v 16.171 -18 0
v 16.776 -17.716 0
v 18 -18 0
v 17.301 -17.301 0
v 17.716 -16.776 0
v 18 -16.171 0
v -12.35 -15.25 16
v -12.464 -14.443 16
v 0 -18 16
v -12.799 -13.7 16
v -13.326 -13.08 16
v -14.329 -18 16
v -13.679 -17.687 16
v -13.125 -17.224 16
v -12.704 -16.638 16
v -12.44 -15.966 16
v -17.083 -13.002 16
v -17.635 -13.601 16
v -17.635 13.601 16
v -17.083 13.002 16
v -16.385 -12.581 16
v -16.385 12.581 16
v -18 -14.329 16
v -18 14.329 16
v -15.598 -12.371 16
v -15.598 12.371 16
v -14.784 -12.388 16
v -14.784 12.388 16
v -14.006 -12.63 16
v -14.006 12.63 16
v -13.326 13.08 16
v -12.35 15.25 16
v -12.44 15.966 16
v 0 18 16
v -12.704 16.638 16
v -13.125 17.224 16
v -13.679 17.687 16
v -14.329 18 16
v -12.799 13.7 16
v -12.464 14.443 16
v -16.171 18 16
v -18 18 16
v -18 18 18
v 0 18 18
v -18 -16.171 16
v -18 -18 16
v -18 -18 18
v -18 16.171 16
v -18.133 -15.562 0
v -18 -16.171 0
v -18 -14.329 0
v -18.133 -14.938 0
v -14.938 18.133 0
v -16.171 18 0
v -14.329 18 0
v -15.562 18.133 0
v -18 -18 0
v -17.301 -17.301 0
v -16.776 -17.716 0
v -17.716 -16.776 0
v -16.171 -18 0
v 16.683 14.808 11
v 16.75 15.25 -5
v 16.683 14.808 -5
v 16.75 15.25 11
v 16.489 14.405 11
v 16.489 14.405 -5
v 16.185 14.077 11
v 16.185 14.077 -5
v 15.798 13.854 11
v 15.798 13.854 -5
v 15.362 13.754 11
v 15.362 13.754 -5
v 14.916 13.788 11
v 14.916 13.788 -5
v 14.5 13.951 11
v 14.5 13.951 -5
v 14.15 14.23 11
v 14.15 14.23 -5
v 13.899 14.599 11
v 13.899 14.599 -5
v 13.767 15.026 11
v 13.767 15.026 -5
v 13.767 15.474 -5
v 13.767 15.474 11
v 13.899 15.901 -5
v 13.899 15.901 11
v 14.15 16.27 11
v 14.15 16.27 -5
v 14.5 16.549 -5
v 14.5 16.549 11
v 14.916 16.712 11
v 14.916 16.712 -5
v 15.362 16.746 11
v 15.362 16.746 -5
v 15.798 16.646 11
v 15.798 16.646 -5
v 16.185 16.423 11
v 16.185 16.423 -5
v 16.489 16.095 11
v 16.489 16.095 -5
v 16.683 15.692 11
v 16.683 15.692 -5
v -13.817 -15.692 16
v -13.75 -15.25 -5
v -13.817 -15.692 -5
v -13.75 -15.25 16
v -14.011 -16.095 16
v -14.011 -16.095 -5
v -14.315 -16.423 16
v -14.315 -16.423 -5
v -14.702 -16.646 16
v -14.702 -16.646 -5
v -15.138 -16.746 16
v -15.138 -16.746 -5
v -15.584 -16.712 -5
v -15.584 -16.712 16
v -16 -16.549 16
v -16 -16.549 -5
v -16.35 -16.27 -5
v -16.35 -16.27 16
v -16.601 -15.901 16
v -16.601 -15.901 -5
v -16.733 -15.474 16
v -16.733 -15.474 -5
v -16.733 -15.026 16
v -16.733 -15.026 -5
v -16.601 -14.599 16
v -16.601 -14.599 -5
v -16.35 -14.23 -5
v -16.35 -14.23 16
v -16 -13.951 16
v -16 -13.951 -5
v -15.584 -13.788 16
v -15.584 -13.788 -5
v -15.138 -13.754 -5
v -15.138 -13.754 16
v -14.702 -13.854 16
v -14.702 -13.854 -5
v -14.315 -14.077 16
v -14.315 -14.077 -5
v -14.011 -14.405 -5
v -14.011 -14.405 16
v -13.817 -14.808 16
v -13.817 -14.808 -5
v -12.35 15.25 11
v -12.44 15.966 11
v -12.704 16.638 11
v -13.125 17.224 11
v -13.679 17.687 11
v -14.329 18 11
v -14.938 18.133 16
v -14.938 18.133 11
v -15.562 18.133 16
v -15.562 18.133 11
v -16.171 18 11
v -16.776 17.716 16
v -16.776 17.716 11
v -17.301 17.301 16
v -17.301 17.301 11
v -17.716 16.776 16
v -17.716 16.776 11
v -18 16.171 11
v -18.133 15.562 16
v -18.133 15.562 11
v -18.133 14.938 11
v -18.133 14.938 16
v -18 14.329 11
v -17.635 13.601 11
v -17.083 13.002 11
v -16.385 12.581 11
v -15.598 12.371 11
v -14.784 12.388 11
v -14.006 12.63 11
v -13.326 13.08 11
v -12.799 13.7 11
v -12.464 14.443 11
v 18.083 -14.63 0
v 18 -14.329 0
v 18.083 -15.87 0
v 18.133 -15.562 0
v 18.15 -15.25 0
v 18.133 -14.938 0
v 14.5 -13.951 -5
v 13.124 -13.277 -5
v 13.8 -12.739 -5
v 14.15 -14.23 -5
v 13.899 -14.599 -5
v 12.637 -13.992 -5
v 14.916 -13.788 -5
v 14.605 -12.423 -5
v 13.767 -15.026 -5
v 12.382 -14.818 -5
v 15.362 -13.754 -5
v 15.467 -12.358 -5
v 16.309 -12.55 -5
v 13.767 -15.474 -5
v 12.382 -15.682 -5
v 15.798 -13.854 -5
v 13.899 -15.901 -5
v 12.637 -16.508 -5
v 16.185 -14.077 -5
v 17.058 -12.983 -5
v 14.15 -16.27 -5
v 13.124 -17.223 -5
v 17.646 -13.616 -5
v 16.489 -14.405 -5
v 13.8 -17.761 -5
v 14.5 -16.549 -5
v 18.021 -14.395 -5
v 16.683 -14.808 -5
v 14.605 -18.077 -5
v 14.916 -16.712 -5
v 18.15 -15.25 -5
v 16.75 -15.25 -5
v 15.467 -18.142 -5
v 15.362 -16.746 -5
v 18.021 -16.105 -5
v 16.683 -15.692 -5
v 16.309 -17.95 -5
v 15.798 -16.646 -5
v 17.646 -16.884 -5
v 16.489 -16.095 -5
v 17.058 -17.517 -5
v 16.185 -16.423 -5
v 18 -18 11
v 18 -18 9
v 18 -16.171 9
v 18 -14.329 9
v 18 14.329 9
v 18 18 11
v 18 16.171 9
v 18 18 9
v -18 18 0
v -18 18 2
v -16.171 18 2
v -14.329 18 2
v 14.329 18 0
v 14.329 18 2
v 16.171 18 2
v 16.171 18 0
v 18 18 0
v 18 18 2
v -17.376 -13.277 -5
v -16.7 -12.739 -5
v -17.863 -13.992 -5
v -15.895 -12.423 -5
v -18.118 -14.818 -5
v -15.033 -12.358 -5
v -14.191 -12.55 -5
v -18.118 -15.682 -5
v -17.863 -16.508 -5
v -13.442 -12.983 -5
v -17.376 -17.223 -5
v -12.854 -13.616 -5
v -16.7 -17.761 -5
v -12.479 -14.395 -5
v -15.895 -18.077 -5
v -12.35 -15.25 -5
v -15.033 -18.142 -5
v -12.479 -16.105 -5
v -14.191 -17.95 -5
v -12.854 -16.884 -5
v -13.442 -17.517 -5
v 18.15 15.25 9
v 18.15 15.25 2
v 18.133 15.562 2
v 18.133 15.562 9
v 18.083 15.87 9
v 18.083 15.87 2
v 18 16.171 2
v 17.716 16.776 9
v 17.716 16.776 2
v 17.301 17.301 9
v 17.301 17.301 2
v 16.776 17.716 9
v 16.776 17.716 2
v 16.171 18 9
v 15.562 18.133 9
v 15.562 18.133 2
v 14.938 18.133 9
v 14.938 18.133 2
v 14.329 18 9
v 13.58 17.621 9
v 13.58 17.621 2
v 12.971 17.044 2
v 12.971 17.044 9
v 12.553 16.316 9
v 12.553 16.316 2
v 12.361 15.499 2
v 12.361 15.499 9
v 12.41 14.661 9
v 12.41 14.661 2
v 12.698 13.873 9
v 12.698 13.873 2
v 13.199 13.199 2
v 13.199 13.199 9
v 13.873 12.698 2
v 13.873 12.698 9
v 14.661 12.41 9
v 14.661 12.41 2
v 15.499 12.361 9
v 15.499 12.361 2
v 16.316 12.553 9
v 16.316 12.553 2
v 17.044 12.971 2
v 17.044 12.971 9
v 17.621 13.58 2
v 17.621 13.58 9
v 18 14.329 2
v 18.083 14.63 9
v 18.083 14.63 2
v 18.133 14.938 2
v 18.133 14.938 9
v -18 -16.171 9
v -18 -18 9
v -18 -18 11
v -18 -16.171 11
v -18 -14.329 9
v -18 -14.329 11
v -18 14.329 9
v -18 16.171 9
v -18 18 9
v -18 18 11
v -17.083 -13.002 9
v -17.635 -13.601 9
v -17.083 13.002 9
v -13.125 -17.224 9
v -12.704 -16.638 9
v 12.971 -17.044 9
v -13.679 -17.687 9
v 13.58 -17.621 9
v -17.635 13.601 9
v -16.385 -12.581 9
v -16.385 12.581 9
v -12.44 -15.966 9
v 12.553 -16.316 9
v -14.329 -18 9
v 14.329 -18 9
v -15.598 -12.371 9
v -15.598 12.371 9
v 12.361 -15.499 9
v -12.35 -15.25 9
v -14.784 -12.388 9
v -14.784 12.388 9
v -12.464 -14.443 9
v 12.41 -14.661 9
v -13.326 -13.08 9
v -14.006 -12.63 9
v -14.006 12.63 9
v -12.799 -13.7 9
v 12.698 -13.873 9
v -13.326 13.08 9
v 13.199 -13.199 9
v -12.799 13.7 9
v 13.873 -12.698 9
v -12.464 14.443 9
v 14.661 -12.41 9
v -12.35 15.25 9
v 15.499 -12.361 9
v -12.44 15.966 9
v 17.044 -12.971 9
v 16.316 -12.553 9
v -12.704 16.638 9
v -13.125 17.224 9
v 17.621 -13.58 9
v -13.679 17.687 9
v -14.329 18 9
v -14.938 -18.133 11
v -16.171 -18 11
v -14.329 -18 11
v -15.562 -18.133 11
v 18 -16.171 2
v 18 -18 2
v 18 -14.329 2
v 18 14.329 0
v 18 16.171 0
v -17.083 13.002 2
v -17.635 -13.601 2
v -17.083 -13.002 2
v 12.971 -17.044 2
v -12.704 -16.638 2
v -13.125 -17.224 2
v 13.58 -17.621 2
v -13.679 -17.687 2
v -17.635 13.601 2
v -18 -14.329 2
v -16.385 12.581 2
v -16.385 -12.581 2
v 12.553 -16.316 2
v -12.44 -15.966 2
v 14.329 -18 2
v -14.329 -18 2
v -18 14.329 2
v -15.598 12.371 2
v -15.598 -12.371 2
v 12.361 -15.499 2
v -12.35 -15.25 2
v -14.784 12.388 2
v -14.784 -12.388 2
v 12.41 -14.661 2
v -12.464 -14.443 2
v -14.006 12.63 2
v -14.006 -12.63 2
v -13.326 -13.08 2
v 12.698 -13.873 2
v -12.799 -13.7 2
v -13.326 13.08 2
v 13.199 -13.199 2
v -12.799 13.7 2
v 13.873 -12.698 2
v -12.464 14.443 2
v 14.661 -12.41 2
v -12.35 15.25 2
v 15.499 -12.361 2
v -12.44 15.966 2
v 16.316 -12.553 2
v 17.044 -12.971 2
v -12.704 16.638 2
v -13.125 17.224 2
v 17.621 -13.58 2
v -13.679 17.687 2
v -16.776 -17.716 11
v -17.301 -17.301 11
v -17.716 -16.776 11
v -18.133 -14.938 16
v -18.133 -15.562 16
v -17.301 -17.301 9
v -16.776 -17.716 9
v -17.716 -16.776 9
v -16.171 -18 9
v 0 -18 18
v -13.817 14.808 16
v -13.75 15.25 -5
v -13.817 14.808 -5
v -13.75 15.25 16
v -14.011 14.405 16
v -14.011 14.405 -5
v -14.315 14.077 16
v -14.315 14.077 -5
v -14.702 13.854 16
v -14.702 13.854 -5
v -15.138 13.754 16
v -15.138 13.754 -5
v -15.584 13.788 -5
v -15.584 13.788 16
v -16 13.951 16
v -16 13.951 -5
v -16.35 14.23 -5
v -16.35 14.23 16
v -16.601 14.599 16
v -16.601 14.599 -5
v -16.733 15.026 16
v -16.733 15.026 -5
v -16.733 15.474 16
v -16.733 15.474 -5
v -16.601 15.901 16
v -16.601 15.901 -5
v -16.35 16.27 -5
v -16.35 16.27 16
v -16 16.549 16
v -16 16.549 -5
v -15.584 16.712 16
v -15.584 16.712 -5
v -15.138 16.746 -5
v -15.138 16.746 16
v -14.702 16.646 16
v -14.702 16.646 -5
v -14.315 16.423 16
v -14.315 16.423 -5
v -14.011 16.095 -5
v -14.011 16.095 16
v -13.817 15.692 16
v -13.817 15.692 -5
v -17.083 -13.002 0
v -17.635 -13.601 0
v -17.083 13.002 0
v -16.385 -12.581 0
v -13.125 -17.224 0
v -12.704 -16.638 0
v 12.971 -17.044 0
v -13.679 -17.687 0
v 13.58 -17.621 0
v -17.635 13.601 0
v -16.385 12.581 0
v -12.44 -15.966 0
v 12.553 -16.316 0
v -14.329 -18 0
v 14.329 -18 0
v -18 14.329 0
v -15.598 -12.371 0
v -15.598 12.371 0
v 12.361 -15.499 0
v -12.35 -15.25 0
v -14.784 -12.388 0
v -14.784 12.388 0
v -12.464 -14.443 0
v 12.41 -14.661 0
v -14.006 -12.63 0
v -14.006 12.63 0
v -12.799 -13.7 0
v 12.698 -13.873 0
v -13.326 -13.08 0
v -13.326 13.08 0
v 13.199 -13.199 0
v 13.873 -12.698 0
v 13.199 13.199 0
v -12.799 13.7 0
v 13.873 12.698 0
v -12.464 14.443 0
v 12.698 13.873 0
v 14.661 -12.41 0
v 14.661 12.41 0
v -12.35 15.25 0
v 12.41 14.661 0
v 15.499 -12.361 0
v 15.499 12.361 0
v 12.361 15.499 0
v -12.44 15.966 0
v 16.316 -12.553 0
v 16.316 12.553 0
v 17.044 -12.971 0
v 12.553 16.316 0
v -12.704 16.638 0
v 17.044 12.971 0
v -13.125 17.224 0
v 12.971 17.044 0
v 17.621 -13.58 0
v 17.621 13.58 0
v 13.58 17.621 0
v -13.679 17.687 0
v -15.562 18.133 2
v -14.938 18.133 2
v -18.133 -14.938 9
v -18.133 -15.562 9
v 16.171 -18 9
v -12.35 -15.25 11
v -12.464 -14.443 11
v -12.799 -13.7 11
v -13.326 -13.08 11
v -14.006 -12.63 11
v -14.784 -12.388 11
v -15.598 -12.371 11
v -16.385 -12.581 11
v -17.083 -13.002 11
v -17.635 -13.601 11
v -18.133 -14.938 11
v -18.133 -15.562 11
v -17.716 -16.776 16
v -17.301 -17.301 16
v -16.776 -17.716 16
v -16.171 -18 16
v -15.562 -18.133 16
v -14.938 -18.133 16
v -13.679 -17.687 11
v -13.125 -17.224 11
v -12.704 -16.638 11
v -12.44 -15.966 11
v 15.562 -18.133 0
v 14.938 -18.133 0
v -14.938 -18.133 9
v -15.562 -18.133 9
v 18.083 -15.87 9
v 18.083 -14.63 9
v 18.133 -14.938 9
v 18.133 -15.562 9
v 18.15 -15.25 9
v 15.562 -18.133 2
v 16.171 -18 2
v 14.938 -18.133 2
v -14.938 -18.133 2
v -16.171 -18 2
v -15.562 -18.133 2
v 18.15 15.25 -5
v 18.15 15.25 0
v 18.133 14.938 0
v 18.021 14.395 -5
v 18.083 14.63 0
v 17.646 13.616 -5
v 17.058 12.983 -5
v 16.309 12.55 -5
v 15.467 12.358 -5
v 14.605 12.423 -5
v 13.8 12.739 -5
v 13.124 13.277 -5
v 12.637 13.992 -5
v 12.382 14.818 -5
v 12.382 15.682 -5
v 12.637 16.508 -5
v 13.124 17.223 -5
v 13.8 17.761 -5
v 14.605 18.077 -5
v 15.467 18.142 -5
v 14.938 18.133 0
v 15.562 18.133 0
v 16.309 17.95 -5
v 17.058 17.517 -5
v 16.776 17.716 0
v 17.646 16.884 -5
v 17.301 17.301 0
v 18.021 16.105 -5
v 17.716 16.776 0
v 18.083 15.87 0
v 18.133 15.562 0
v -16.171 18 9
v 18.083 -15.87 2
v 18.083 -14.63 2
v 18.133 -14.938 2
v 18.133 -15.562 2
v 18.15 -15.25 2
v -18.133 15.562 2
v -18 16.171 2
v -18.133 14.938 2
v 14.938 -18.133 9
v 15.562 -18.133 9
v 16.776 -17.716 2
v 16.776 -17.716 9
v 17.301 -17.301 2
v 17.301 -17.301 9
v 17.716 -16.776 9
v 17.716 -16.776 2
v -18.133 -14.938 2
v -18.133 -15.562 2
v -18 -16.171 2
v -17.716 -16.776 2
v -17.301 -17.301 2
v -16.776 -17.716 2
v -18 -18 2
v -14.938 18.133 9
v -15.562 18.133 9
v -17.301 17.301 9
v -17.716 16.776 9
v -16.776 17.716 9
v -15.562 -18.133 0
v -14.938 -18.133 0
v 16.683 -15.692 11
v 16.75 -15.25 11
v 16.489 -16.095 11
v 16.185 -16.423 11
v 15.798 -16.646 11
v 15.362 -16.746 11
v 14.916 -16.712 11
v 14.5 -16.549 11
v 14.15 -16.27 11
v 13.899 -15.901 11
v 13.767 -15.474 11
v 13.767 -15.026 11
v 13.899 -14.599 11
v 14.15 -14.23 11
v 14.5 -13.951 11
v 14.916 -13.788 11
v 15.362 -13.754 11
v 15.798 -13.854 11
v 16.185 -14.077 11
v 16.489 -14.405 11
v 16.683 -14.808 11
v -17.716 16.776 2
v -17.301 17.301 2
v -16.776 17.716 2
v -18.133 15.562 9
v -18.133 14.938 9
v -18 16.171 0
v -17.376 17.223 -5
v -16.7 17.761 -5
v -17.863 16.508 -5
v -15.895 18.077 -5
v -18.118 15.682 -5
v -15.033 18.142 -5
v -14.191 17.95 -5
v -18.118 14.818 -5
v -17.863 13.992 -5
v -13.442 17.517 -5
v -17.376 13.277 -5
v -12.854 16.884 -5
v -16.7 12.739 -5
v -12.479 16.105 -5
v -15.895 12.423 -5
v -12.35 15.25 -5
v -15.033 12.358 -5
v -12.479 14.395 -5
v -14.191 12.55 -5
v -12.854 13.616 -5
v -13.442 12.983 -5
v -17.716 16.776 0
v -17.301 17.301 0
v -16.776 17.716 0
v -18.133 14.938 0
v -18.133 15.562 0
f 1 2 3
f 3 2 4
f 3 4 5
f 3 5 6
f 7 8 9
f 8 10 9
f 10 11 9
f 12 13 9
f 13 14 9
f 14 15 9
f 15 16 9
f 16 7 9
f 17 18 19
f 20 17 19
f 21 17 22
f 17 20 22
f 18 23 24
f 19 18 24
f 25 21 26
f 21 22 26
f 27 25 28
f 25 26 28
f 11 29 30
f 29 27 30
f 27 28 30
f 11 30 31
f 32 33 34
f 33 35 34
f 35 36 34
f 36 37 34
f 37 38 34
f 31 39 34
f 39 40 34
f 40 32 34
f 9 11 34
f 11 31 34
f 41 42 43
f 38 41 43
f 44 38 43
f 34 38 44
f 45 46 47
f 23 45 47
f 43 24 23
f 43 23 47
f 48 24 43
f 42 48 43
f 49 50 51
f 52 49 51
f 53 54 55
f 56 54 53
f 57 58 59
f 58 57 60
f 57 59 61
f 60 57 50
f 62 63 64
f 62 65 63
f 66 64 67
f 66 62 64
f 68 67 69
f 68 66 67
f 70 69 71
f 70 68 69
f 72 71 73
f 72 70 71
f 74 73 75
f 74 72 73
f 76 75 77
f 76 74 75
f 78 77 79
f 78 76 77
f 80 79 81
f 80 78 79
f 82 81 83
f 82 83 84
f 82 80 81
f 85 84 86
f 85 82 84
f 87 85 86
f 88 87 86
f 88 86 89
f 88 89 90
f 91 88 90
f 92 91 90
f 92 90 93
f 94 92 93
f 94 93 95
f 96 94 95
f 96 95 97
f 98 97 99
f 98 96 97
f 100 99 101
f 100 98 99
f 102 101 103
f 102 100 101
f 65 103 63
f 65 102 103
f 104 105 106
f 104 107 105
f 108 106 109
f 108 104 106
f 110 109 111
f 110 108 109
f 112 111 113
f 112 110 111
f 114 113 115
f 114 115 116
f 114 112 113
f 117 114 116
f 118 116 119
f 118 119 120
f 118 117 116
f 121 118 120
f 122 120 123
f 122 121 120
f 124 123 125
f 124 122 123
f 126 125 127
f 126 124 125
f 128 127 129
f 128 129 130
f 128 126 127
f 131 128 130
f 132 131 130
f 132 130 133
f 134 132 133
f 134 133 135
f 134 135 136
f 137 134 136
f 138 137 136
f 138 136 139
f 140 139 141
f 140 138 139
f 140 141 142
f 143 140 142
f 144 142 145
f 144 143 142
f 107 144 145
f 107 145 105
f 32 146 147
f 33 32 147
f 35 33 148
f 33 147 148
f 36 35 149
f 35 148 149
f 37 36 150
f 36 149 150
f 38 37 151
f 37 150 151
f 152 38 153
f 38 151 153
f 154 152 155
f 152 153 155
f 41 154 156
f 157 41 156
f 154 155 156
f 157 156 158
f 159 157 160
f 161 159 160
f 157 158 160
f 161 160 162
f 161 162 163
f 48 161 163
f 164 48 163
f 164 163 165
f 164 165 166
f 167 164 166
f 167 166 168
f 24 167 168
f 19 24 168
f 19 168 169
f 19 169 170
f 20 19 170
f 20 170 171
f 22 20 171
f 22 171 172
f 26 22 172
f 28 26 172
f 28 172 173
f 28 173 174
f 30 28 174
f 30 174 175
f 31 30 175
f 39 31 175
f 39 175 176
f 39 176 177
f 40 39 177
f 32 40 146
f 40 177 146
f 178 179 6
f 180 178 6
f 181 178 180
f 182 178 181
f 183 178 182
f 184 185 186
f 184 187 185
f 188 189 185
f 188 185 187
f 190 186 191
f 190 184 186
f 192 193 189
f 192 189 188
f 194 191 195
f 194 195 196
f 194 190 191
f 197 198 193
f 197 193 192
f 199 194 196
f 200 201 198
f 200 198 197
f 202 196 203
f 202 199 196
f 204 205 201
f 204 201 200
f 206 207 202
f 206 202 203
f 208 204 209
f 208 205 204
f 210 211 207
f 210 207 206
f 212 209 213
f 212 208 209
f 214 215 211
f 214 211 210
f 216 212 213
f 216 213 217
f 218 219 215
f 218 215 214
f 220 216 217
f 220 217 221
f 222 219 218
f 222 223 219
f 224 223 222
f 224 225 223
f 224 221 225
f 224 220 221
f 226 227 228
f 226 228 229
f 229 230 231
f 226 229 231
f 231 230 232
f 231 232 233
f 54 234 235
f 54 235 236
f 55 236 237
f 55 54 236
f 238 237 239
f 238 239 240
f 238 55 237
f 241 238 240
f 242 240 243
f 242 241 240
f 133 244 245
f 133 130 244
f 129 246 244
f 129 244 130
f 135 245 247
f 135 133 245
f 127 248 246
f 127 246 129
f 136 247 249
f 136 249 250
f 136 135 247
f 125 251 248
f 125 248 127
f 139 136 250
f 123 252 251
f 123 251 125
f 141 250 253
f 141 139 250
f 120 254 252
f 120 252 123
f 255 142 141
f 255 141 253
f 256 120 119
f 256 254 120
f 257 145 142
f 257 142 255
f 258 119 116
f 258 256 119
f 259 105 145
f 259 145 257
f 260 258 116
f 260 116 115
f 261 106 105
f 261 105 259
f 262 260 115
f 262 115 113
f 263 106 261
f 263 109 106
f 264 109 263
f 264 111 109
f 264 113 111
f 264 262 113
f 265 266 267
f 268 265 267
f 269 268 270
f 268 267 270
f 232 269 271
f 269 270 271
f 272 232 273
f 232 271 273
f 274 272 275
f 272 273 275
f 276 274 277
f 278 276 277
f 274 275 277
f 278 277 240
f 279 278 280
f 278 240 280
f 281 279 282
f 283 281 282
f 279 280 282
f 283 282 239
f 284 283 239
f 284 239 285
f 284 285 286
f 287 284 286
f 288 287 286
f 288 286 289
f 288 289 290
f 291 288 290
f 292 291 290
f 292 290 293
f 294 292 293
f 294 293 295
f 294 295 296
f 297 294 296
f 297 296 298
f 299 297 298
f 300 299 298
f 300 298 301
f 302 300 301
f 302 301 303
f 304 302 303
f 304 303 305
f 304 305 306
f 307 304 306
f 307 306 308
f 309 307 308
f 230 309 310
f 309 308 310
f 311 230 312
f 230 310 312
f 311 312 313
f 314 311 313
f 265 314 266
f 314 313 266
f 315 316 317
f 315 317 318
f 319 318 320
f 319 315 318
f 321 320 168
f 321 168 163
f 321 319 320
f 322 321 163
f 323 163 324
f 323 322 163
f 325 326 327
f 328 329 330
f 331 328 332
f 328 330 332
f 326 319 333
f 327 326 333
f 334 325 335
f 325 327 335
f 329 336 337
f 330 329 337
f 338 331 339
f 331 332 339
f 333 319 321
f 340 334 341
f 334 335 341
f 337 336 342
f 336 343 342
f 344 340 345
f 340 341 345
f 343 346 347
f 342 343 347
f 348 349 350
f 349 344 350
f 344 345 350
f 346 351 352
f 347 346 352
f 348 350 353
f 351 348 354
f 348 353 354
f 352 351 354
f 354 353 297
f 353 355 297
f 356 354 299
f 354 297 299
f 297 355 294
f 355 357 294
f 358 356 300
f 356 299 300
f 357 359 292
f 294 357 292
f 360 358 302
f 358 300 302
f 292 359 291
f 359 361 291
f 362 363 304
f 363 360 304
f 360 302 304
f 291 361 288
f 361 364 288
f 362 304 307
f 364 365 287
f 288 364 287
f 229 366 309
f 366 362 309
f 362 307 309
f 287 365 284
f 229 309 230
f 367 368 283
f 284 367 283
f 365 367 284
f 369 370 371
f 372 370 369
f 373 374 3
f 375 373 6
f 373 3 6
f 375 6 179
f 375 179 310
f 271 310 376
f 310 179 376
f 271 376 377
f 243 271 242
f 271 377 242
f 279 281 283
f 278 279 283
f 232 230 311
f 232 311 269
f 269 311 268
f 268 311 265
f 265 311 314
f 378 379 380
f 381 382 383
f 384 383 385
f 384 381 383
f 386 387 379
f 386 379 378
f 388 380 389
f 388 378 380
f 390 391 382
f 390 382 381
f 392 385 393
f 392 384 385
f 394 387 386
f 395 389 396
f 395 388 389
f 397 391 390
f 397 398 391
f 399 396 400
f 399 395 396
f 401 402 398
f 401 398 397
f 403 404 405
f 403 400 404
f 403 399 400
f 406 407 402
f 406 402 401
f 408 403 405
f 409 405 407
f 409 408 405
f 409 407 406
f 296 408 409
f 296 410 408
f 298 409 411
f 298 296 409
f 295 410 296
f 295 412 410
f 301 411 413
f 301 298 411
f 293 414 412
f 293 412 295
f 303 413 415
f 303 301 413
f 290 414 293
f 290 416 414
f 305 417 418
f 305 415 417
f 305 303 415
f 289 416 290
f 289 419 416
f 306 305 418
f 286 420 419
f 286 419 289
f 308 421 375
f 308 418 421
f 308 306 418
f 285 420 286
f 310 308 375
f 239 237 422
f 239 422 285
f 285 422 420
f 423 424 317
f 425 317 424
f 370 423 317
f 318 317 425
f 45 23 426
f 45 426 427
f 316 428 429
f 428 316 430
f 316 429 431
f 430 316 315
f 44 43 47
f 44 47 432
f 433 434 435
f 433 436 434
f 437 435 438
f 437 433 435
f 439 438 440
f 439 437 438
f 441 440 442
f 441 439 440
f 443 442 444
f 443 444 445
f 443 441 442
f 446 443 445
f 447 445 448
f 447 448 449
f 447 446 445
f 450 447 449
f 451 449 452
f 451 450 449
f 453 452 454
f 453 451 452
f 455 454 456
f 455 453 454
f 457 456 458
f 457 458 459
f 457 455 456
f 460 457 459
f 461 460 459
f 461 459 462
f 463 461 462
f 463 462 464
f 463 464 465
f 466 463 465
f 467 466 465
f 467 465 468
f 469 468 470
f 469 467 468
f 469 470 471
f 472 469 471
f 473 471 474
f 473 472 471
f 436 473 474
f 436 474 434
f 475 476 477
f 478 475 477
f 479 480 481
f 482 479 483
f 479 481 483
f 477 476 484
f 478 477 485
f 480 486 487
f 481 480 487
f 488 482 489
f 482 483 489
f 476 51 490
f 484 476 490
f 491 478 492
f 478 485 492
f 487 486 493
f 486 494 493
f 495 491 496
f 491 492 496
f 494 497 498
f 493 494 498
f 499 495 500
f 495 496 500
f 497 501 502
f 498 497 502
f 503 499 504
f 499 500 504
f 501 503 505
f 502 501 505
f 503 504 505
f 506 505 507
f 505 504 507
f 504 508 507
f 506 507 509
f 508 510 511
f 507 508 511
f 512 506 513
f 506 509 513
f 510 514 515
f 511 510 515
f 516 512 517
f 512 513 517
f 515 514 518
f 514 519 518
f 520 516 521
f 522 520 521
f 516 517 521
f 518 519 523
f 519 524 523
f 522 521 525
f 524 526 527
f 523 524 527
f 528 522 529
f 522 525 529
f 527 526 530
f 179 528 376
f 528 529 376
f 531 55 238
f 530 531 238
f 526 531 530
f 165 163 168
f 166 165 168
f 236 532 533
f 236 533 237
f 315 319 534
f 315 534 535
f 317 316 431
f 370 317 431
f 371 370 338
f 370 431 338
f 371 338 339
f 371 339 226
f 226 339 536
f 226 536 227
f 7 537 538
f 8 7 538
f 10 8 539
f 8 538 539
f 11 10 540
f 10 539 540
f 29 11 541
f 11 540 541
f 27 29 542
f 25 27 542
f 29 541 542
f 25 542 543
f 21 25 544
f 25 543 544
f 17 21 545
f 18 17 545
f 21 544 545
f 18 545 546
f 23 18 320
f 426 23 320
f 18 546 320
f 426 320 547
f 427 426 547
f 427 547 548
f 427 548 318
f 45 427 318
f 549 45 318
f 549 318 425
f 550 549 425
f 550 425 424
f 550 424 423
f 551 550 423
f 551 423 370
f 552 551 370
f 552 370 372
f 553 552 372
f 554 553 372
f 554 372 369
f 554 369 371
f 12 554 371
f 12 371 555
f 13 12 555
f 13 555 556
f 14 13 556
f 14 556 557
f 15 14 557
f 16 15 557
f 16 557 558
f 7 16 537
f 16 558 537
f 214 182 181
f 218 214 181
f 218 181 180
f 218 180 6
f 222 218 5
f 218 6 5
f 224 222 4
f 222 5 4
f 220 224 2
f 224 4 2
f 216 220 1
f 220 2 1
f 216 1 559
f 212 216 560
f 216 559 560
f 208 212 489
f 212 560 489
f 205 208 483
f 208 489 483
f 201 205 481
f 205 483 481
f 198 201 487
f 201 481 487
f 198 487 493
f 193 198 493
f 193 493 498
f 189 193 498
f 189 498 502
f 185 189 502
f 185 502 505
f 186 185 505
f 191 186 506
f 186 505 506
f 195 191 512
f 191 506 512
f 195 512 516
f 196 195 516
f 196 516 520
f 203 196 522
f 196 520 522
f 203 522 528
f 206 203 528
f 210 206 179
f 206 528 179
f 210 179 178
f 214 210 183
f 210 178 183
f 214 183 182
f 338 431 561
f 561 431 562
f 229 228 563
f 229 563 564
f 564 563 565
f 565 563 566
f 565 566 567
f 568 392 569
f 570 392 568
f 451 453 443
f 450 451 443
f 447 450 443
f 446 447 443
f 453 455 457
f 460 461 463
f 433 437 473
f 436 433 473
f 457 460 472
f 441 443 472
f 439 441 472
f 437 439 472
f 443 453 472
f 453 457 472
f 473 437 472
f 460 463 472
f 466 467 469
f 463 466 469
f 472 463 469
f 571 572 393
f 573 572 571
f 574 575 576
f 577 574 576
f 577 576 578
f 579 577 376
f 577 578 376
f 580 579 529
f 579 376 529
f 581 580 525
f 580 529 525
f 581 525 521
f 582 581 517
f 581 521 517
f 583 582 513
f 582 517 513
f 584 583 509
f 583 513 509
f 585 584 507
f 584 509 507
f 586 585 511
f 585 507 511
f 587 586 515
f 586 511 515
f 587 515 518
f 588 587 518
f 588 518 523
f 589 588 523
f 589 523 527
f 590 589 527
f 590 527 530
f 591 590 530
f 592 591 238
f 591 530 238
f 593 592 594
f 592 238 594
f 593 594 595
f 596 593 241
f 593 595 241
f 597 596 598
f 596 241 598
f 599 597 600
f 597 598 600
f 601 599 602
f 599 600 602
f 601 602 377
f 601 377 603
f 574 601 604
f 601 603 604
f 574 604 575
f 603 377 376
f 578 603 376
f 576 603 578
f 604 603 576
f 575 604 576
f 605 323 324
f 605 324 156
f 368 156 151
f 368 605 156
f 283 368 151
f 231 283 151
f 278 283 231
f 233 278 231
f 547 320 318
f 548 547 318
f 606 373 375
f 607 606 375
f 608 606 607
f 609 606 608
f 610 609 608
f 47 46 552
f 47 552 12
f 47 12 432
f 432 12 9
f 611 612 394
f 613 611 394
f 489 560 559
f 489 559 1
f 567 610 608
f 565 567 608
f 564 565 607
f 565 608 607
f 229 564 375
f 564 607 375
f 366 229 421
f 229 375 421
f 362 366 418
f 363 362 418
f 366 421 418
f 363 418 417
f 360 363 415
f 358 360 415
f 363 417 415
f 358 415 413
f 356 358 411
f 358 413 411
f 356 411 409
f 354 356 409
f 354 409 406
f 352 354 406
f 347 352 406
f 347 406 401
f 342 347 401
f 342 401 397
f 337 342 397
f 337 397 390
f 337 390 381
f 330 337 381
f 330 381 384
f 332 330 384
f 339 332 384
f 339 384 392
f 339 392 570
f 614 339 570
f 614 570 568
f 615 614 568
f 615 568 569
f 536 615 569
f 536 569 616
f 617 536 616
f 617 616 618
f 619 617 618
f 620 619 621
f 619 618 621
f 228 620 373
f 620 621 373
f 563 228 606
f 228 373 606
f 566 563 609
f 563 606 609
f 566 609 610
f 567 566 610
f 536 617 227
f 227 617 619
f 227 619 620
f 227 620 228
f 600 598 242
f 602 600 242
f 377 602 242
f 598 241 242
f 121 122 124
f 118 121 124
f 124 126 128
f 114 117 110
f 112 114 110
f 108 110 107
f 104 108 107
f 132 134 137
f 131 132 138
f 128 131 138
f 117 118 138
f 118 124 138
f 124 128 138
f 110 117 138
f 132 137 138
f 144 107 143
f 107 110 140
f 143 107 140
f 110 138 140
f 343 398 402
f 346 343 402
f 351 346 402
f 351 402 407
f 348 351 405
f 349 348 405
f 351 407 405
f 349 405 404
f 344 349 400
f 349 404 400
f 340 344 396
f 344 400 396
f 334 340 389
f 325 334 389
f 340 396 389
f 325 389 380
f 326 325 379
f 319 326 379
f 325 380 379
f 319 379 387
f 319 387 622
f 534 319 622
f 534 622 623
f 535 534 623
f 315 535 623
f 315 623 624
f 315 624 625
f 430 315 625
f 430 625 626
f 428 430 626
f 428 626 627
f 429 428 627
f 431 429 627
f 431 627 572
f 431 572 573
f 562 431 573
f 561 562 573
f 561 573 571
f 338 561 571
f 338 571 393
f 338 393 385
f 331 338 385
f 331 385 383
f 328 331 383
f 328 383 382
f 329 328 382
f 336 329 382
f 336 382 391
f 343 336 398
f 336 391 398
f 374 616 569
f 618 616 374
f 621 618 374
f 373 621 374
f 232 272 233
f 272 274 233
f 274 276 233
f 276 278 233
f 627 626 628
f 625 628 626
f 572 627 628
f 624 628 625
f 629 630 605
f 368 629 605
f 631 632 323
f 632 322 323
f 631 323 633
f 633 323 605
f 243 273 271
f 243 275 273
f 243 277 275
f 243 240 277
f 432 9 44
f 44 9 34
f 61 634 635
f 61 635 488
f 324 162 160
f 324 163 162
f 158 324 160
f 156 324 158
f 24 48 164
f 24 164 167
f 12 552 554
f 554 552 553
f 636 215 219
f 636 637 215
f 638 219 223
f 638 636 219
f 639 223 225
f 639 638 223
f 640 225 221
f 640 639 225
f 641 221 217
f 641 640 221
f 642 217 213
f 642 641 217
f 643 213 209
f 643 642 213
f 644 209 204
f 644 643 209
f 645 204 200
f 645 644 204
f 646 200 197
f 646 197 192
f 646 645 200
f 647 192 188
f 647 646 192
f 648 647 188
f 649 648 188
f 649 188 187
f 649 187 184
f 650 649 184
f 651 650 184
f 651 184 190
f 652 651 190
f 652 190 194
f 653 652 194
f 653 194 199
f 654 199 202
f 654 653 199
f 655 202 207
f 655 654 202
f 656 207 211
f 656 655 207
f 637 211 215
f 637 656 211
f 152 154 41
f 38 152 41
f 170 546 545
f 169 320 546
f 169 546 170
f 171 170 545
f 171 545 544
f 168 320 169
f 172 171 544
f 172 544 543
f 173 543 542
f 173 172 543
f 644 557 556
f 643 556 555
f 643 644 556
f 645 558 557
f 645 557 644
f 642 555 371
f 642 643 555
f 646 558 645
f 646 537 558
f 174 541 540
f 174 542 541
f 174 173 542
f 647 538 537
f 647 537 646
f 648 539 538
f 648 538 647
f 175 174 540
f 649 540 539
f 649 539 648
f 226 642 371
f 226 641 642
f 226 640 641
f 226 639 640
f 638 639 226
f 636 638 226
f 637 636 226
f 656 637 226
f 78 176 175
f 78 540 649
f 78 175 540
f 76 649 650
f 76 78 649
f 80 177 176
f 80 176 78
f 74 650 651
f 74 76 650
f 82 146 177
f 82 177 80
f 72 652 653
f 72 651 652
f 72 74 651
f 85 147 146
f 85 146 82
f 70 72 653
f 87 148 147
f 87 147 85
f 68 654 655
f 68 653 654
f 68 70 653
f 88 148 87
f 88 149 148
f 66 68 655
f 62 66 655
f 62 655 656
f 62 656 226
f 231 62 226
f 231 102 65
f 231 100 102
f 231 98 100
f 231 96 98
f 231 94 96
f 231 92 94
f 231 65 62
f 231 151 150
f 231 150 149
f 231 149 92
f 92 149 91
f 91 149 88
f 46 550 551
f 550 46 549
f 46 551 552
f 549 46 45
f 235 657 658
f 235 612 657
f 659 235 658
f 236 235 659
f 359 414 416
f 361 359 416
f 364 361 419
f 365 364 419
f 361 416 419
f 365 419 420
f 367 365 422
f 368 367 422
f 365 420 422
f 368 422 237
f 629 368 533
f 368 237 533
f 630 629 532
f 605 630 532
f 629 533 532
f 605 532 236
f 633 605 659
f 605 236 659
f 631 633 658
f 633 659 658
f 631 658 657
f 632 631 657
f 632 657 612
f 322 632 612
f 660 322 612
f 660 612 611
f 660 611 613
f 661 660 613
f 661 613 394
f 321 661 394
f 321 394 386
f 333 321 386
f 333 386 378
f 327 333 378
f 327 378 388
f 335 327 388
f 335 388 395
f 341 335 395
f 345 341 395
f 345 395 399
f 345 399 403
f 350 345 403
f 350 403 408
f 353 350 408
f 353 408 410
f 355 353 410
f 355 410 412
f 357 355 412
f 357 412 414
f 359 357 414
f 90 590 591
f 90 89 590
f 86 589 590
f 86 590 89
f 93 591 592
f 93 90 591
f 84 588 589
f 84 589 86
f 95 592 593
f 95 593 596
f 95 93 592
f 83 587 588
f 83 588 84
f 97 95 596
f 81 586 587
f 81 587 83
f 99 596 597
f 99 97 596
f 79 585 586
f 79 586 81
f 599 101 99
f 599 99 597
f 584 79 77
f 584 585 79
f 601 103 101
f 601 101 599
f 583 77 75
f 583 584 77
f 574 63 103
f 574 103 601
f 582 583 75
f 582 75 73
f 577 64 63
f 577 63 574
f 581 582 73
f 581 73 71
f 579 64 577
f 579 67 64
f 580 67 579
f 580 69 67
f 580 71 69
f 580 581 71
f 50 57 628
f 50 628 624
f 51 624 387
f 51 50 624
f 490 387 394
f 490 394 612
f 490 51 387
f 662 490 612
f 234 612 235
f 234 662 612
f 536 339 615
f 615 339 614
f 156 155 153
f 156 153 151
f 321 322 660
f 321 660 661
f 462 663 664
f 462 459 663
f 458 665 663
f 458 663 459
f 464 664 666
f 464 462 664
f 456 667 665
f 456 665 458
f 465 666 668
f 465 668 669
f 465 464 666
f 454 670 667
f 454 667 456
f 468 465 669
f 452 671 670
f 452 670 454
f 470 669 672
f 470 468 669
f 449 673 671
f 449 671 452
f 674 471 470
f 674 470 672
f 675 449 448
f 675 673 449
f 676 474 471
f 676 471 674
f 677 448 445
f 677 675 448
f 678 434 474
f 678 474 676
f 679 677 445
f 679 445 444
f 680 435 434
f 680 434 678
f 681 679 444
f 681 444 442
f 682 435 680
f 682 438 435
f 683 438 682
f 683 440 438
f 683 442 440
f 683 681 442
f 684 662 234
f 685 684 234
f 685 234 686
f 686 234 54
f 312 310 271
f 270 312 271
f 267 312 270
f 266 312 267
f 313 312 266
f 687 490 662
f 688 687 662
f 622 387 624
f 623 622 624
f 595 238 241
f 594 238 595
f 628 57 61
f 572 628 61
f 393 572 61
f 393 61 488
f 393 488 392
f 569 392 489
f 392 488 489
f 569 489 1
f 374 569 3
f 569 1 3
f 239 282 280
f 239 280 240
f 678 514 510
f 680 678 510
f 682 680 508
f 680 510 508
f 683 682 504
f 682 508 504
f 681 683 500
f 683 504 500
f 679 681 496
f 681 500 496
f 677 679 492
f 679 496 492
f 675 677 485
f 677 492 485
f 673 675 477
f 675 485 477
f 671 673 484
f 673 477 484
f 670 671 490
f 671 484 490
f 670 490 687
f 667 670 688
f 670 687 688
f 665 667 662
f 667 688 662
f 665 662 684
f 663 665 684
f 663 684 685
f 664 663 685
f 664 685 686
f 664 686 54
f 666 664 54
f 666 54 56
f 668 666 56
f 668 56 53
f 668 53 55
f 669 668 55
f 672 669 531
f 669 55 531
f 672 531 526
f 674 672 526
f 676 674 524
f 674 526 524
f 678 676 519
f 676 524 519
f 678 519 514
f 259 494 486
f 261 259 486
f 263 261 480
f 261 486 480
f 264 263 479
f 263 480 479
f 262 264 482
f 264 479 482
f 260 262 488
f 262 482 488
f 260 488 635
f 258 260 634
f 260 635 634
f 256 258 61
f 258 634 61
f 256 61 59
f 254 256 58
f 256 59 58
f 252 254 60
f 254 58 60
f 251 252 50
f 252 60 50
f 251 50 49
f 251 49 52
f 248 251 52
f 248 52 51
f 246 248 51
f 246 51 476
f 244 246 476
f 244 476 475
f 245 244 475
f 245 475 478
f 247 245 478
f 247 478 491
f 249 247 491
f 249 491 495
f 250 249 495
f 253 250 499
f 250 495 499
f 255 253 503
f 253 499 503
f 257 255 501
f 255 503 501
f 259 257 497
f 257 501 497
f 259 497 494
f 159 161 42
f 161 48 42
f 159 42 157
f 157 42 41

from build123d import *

# Parameters (mm, degrees)
SKETCH_W      = 36
SKETCH_H      = 36
SKETCH_R      = 1.5
PAD_DEPTH     = 2
SKETCH001_R   = 2.9
SKETCH001_R_2 = 1.5
PAD001_DEPTH  = 7
SKETCH002_W   = 36
SKETCH002_H   = 36
SKETCH002_R   = 1.5
PAD002_DEPTH  = 2
SKETCH003_R   = 2.9
SKETCH003_R_2 = 1.5
PAD003_DEPTH  = 5
SKETCH004_W   = 18
SKETCH004_H   = 36
PAD004_DEPTH  = 2
SKETCH005_R   = 2.9
SKETCH005_R_2 = 1.5
PAD005_DEPTH  = 5


with BuildPart() as part:
    # Sketch → Pad (new body)
    with BuildSketch(Plane.XY):
        Rectangle(SKETCH_W, SKETCH_H)
        with Locations((-15.25, -15.25)):
            Circle(SKETCH_R, mode=Mode.SUBTRACT)
        with Locations((15.25, -15.25)):
            Circle(SKETCH_R, mode=Mode.SUBTRACT)
        with Locations((-15.25, 15.25)):
            Circle(SKETCH_R, mode=Mode.SUBTRACT)
        with Locations((15.25, 15.25)):
            Circle(SKETCH_R, mode=Mode.SUBTRACT)
    extrude(amount=PAD_DEPTH)

    # Sketch001 (on Face10 of Pad) → Pad001 (join)
    with BuildSketch(Plane.XY.offset(2)):
        with Locations((-15.25, 15.25)):
            Circle(SKETCH001_R)
        with Locations((-15.25, 15.25)):
            Circle(SKETCH001_R_2, mode=Mode.SUBTRACT)
        with Locations((-15.25, -15.25)):
            Circle(SKETCH001_R)
        with Locations((-15.25, -15.25)):
            Circle(SKETCH001_R_2, mode=Mode.SUBTRACT)
        with Locations((15.25, -15.25)):
            Circle(SKETCH001_R)
        with Locations((15.25, -15.25)):
            Circle(SKETCH001_R_2, mode=Mode.SUBTRACT)
        with Locations((15.25, 15.25)):
            Circle(SKETCH001_R)
        with Locations((15.25, 15.25)):
            Circle(SKETCH001_R_2, mode=Mode.SUBTRACT)
    extrude(amount=PAD001_DEPTH)

    # Sketch002 (on Face31 of Pad001) → Pad002 (join)
    with BuildSketch(Plane.XY.offset(9)):
        Rectangle(SKETCH002_W, SKETCH002_H)
        with Locations((-15.25, 15.25)):
            Circle(SKETCH002_R, mode=Mode.SUBTRACT)
        with Locations((15.25, 15.25)):
            Circle(SKETCH002_R, mode=Mode.SUBTRACT)
        with Locations((15.25, -15.25)):
            Circle(SKETCH002_R, mode=Mode.SUBTRACT)
        with Locations((-15.25, -15.25)):
            Circle(SKETCH002_R, mode=Mode.SUBTRACT)
    extrude(amount=PAD002_DEPTH)

    # Sketch003 (on Face52 of Pad002) → Pad003 (join)
    with BuildSketch(Plane.XY.offset(11)):
        with Locations((-15.25, 15.25)):
            Circle(SKETCH003_R)
        with Locations((-15.25, 15.25)):
            Circle(SKETCH003_R_2, mode=Mode.SUBTRACT)
        with Locations((-15.25, -15.25)):
            Circle(SKETCH003_R)
        with Locations((-15.25, -15.25)):
            Circle(SKETCH003_R_2, mode=Mode.SUBTRACT)
    extrude(amount=PAD003_DEPTH)

    # Sketch004 (on Face63 of Pad003) → Pad004 (join)
    with BuildSketch(Plane.XY.offset(16)):
        with Locations((-9, 0)):
            Rectangle(SKETCH004_W, SKETCH004_H)
    extrude(amount=PAD004_DEPTH)

    # Sketch005 (on Face4 of Pad004) → Pad005 (join)
    with BuildSketch(Plane(origin=(0, 0, 0), x_dir=(1, 0, 0), z_dir=(0, 0, -1))):
        with Locations((-15.25, 15.25)):
            Circle(SKETCH005_R)
        with Locations((-15.25, 15.25)):
            Circle(SKETCH005_R_2, mode=Mode.SUBTRACT)
        with Locations((-15.25, -15.25)):
            Circle(SKETCH005_R)
        with Locations((-15.25, -15.25)):
            Circle(SKETCH005_R_2, mode=Mode.SUBTRACT)
        with Locations((15.25, -15.25)):
            Circle(SKETCH005_R)
        with Locations((15.25, -15.25)):
            Circle(SKETCH005_R_2, mode=Mode.SUBTRACT)
        with Locations((15.25, 15.25)):
            Circle(SKETCH005_R)
        with Locations((15.25, 15.25)):
            Circle(SKETCH005_R_2, mode=Mode.SUBTRACT)
    extrude(amount=PAD005_DEPTH)


solid = part.part
